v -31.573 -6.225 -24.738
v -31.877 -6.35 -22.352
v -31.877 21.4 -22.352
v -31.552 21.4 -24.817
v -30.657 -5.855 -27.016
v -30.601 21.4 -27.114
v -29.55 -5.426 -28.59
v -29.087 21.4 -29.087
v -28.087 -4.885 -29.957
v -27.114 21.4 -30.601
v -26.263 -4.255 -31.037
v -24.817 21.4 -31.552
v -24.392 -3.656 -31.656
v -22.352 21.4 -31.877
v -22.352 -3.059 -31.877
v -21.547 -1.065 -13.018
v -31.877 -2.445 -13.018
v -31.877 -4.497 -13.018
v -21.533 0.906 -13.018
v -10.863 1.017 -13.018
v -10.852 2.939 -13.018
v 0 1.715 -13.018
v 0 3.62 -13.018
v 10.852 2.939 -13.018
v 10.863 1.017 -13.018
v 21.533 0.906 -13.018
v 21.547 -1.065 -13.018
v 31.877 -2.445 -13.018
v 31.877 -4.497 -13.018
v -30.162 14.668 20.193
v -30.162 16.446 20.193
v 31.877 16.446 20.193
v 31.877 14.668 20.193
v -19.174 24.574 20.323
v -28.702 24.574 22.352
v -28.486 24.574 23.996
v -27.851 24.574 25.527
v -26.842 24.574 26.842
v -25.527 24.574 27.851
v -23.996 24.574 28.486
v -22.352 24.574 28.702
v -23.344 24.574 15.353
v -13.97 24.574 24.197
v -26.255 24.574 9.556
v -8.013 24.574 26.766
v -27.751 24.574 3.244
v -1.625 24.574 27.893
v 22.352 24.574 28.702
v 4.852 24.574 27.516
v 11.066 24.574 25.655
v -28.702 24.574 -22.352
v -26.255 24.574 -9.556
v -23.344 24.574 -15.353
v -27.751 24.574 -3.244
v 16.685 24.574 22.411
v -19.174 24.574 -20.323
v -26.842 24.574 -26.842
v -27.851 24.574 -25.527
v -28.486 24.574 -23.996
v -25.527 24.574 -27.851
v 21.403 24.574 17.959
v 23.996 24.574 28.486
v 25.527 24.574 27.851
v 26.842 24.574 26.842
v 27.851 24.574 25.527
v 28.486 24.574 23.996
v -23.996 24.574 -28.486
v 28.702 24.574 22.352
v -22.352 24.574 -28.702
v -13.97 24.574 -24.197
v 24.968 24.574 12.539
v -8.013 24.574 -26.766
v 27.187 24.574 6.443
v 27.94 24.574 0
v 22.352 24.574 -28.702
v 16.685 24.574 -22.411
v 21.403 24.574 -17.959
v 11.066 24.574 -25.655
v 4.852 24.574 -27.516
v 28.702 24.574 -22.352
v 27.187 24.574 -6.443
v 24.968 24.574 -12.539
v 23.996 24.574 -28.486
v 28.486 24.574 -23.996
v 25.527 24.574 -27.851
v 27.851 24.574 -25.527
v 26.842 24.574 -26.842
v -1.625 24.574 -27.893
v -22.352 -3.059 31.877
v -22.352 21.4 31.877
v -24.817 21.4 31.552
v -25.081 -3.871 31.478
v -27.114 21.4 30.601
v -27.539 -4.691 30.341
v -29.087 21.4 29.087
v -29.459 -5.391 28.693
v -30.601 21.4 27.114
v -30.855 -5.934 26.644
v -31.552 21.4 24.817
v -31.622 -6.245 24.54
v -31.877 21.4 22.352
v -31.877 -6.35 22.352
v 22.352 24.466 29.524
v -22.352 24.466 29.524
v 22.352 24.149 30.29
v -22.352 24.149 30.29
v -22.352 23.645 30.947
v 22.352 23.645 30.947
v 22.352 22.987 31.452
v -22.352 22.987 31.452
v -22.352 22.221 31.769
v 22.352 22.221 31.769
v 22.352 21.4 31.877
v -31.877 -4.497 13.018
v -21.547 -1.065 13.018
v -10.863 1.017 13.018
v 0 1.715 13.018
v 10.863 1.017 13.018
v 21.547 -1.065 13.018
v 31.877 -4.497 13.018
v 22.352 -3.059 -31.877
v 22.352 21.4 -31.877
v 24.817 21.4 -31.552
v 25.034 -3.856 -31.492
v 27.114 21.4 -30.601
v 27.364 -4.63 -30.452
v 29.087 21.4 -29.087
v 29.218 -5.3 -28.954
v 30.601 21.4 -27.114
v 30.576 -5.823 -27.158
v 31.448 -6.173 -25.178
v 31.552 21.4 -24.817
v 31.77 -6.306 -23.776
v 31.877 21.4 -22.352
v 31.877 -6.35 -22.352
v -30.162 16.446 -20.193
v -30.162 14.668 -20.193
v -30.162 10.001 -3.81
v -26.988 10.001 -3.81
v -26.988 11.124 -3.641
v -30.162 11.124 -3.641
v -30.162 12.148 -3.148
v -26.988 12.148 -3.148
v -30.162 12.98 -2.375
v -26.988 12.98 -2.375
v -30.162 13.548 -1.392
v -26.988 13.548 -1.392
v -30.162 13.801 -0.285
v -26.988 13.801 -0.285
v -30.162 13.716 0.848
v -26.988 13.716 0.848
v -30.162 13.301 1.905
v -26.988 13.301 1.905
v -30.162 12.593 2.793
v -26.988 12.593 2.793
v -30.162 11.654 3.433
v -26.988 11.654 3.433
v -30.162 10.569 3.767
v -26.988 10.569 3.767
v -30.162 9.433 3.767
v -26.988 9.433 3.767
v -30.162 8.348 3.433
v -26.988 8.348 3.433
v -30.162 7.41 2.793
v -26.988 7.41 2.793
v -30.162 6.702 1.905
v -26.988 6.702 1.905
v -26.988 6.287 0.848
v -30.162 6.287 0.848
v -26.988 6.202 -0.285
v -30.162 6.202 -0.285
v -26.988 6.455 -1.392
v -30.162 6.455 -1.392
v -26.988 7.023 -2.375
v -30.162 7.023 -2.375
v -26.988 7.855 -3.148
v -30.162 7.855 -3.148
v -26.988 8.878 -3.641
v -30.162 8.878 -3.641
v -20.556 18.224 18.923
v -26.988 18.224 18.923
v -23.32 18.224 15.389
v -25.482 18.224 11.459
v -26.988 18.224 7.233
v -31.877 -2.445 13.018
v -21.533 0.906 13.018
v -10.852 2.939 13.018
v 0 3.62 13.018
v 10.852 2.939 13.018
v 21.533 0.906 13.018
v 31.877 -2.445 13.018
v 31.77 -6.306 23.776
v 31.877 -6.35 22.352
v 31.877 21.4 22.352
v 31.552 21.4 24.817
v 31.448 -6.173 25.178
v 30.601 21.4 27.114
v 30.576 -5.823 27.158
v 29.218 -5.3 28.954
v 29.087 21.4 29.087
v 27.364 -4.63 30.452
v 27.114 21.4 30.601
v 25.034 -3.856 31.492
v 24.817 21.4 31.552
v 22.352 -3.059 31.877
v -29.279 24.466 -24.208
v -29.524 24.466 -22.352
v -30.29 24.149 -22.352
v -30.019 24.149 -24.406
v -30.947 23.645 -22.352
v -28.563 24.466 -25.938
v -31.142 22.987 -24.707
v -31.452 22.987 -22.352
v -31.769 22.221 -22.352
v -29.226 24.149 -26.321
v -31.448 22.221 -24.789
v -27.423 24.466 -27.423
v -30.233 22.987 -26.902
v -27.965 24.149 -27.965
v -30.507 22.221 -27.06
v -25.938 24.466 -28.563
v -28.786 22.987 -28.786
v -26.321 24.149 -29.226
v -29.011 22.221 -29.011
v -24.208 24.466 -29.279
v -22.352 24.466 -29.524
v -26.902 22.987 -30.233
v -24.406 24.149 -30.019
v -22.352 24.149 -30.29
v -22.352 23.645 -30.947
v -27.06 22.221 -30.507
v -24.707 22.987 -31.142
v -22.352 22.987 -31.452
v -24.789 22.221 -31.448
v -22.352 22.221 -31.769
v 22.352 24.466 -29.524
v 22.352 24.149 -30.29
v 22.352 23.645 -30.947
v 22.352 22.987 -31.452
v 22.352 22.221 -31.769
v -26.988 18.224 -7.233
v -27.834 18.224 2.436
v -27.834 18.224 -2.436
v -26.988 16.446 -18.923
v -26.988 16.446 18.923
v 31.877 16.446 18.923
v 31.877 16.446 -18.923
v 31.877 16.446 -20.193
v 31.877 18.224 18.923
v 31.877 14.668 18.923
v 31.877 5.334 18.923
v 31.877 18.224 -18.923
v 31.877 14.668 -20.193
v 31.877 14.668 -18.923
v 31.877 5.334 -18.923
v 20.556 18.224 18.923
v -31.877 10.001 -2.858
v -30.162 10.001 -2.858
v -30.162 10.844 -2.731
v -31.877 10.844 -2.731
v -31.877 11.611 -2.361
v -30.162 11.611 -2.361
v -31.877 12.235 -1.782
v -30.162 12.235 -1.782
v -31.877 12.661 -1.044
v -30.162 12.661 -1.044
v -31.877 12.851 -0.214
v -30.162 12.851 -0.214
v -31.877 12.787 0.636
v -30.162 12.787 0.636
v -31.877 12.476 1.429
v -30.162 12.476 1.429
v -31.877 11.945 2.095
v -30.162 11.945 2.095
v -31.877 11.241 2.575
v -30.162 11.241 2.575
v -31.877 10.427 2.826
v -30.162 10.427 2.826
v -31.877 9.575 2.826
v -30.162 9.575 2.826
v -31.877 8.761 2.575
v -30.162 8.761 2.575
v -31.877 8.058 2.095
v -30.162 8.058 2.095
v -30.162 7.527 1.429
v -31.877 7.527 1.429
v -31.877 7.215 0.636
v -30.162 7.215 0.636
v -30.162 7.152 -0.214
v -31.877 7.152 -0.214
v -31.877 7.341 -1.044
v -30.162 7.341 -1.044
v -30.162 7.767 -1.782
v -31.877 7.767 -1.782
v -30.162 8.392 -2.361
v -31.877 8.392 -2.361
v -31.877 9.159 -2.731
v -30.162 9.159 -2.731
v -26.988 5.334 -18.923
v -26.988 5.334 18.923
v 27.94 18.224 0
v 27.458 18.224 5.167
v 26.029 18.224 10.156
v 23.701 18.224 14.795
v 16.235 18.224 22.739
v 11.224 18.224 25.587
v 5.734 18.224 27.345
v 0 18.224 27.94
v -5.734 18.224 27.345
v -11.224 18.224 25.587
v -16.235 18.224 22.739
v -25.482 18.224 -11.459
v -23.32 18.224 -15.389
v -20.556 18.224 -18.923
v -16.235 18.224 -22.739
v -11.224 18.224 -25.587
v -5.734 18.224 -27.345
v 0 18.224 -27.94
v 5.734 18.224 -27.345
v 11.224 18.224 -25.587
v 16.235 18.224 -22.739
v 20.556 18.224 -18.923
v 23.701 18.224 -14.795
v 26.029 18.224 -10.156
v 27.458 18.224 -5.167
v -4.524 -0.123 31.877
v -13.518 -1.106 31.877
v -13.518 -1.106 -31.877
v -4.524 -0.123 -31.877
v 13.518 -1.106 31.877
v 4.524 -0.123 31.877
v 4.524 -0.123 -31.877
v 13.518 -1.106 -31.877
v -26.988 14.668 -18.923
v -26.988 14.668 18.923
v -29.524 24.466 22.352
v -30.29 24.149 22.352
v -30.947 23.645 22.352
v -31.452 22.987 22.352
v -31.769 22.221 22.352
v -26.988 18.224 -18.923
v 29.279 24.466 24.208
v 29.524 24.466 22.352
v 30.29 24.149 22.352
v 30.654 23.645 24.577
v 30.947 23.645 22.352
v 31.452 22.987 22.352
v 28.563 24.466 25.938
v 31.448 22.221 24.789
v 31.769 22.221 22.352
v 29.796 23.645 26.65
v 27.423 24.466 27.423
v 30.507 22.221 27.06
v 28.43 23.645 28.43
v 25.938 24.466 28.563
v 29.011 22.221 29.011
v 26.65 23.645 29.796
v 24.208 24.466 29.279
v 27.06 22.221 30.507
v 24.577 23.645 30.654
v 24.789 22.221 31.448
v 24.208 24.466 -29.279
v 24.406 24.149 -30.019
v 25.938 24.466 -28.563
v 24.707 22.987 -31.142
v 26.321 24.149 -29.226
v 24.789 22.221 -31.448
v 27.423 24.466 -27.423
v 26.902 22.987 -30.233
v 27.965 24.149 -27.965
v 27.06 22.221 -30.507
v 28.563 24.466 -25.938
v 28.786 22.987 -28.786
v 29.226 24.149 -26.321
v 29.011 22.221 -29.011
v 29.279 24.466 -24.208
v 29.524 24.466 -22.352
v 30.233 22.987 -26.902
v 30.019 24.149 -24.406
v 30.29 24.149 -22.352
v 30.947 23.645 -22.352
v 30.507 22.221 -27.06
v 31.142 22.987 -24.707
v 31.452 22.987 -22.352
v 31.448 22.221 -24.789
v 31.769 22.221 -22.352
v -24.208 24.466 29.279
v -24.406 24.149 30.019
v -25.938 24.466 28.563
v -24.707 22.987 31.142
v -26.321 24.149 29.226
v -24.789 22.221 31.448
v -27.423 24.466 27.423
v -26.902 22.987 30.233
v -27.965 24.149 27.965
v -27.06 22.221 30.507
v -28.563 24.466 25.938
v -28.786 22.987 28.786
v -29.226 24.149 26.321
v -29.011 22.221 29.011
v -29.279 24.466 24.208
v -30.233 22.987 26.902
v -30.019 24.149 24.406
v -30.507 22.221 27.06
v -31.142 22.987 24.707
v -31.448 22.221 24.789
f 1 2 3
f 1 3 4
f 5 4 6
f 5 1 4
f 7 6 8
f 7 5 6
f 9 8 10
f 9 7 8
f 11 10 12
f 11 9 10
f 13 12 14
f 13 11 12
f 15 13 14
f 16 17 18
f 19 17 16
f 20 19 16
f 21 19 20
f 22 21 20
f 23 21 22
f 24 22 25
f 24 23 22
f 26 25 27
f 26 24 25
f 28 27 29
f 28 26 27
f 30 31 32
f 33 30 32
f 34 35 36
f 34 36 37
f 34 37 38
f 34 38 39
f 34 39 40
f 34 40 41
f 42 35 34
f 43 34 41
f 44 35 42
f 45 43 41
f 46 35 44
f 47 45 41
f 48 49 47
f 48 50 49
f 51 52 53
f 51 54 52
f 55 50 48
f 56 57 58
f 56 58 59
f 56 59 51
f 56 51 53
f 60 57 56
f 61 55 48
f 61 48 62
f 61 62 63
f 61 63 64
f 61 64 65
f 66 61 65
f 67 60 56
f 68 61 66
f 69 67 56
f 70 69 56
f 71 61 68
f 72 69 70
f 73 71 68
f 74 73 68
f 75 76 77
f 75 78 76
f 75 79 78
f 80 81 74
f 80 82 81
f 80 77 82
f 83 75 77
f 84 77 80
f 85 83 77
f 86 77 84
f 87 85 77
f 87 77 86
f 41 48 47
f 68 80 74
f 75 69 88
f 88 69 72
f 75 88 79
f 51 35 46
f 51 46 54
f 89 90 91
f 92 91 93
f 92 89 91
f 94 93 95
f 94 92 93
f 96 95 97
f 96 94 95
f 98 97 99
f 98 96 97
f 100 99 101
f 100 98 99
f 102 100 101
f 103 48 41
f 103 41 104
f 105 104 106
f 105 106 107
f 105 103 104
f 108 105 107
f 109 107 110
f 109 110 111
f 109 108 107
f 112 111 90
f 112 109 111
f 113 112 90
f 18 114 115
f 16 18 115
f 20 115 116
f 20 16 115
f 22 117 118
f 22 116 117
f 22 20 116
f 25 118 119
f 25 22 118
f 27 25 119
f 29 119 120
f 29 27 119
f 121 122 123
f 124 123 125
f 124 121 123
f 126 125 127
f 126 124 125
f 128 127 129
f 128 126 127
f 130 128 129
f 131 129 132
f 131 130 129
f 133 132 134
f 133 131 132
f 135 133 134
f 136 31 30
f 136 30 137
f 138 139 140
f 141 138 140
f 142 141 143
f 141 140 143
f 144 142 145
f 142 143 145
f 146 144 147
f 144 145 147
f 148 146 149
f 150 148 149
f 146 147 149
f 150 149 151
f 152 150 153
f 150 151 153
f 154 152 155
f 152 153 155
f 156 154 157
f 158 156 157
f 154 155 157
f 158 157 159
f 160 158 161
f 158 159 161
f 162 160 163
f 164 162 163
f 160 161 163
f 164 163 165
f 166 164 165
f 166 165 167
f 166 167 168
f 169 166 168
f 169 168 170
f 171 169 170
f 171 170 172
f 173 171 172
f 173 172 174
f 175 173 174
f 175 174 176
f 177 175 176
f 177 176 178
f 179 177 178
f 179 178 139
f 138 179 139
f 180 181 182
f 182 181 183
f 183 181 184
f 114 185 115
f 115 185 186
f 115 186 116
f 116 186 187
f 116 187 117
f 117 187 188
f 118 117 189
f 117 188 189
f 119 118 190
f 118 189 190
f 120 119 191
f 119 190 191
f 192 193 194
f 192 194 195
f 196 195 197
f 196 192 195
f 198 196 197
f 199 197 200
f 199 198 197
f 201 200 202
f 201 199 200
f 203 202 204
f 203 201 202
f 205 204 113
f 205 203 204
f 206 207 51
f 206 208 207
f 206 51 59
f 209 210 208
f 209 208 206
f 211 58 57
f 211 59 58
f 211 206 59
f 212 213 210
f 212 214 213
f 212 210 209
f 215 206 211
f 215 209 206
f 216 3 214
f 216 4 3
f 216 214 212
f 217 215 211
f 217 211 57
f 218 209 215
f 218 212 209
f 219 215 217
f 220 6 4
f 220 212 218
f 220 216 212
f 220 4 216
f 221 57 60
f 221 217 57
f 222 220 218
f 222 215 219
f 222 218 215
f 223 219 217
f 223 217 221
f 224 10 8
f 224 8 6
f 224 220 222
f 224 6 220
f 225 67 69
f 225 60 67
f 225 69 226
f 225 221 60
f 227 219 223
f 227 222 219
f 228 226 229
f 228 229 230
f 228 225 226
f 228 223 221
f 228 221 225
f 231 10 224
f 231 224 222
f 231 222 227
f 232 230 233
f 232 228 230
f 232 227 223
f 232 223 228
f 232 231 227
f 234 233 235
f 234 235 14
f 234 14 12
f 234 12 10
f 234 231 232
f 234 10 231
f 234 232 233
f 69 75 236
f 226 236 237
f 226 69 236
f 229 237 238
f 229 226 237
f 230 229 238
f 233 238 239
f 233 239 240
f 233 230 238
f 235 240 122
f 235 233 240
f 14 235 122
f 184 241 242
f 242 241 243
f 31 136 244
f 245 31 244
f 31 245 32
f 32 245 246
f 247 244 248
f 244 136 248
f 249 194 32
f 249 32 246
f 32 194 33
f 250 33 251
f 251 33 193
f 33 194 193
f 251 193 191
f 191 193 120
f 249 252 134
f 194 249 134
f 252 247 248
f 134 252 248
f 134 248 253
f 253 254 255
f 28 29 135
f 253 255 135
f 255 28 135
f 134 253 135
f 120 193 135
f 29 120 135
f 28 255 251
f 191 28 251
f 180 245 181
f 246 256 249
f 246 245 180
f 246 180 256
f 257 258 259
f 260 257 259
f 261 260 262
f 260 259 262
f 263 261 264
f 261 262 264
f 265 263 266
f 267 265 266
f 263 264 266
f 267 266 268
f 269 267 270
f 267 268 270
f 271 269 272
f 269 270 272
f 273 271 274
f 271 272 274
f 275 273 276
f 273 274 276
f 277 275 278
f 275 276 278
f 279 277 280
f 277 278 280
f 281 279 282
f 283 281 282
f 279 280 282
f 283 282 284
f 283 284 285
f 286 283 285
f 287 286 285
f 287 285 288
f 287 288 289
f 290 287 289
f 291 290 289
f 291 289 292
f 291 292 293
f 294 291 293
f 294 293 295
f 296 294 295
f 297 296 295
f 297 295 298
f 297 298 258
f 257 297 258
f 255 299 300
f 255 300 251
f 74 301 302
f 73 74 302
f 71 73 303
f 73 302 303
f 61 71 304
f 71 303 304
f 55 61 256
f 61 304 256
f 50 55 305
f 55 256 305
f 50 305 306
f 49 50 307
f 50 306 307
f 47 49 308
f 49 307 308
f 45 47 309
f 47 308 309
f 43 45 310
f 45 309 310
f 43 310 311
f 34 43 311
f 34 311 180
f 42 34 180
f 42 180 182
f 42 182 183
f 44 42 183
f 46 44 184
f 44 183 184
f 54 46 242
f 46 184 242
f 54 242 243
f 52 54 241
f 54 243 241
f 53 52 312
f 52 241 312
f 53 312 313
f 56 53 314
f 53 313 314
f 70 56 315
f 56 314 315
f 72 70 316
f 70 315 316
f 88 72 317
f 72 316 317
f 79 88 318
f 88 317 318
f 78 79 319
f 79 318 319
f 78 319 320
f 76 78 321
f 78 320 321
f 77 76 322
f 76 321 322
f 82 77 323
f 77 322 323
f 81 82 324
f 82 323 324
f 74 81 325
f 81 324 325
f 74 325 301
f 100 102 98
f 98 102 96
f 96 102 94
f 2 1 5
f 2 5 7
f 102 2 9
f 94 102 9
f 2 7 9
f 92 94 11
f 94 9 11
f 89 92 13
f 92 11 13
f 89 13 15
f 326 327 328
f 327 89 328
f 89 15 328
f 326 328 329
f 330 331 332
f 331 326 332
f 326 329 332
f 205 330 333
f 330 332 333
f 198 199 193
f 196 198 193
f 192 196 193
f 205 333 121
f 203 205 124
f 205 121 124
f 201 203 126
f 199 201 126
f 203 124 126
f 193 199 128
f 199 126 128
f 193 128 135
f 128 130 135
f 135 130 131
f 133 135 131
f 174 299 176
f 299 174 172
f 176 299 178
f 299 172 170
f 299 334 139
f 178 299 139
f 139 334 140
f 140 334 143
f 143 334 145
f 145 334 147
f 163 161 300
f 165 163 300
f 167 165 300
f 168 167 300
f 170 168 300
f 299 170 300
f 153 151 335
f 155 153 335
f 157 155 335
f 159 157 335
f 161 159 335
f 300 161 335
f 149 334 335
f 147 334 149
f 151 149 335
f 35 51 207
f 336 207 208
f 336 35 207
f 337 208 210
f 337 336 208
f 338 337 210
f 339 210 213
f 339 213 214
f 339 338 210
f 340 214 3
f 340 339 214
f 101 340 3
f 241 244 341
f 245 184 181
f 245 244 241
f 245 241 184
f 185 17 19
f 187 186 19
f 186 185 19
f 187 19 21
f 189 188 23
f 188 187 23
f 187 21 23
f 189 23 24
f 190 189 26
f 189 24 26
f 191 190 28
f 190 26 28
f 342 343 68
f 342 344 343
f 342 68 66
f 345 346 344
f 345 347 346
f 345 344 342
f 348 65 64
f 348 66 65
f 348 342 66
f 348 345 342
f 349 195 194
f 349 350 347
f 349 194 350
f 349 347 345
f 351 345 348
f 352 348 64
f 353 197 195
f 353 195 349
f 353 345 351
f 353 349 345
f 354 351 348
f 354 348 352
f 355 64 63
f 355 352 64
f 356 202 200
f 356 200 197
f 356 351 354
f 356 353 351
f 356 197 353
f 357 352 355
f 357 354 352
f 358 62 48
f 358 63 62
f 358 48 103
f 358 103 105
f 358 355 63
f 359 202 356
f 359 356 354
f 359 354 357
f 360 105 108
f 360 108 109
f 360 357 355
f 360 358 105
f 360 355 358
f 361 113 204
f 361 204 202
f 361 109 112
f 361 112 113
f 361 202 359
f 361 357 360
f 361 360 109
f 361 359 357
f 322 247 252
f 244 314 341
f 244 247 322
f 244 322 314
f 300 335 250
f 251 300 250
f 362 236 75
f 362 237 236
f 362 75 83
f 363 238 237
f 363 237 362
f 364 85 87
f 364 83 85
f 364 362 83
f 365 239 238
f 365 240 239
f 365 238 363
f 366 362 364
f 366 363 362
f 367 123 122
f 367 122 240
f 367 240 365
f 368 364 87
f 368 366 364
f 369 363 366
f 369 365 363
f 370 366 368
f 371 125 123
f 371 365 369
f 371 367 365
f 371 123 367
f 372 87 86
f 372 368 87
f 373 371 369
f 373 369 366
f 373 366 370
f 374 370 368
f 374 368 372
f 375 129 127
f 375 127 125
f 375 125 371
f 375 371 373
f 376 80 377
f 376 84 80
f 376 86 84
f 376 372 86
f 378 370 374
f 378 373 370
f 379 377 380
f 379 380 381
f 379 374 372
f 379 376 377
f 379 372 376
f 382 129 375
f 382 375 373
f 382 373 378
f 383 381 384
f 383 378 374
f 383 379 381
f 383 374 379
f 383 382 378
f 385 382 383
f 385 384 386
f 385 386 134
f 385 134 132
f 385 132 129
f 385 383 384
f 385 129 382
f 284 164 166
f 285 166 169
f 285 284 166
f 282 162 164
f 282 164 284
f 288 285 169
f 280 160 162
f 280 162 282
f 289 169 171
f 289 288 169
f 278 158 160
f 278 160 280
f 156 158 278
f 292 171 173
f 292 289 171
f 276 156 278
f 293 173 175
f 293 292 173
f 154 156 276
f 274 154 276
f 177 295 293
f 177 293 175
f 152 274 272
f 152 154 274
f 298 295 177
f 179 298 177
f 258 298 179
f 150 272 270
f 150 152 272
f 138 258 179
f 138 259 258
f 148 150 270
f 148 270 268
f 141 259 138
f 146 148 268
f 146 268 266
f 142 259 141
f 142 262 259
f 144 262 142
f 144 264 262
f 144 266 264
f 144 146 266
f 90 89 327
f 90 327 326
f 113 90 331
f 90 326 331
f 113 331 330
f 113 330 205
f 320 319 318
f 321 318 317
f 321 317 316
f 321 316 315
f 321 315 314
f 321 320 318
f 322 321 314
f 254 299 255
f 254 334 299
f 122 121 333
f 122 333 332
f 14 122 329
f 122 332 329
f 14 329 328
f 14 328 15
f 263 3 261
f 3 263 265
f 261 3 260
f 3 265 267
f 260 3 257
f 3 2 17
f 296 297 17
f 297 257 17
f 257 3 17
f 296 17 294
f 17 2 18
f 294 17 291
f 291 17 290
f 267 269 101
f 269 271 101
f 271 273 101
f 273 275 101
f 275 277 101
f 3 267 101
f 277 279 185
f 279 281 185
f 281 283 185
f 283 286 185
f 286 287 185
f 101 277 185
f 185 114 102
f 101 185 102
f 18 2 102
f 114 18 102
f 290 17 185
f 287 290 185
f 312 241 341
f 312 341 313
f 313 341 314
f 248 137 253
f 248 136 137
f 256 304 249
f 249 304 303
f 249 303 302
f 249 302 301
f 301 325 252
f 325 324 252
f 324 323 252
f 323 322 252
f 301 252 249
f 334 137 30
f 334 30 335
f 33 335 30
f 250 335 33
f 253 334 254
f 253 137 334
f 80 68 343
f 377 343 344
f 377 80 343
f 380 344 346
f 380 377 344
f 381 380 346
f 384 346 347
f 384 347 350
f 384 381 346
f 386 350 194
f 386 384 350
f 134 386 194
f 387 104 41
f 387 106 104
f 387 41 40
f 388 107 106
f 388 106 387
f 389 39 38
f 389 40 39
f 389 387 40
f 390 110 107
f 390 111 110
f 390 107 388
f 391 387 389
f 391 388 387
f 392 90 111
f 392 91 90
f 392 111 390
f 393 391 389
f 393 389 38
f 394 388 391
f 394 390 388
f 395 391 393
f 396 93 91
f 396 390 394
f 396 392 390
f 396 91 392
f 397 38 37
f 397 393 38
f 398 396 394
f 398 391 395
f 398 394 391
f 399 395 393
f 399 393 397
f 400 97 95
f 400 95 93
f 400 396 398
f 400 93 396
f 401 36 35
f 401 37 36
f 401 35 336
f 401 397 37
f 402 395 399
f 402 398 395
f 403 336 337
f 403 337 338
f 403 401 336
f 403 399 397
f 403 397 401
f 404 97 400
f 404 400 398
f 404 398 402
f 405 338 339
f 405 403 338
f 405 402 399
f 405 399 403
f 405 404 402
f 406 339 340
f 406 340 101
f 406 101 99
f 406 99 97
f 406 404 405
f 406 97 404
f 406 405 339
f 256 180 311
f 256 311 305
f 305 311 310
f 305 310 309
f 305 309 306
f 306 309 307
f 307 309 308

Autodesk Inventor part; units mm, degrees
ref_plane "YZ Plane" through (0, 0, 0) normal (1, 0, 0) x (0, 1, 0)
ref_plane "XZ Plane" through (0, 0, 0) normal (0, 1, 0) x (-1, 0, 0)
ref_plane "XY Plane" through (0, 0, 0) normal (0, 0, 1) x (1, 0, 0)
sketch "Sketch1" plane through (0, 0, 0) normal (0, 0, 1) x (1, 0, 0)
  arc A0 (31.877, -6.35) -> (-31.877, -6.35) centre (0, -83.1863) ccw
  line L0 (-31.877, -6.35) -> (31.877, -6.35) construction
  line L1 (0, 36.3731) -> (0, -103.1128) construction
  line L2 (-44.6278, 0) -> (44.6278, 0) construction
  line L3 (-31.877, -6.35) -> (-31.877, -4.497)
  line L4 (-31.877, 16.4465) -> (31.877, 16.4465)
  line L5 (31.877, 16.4465) -> (31.877, -2.4453)
  line L6 (-30.1625, 16.4465) -> (-30.1625, 5.334) construction
  line L7 (-30.1625, 5.334) -> (30.1625, 5.334) construction
  line L8 (30.1625, 5.334) -> (30.1625, 16.4465) construction
  arc A1 (31.877, -4.497) -> (-31.877, -4.497) centre (0, -83.1863) ccw
  arc A2 (31.877, -2.4453) -> (-31.877, -2.4453) centre (0, -83.1863) ccw
  line L9 (-30.1625, 13.1134) -> (-26.9875, 13.1134) construction
  line L10 (-26.9875, 13.1134) -> (-26.9875, 5.334) construction
  line L11 (30.1625, 12.4907) -> (26.9875, 12.4907) construction
  line L12 (26.9875, 12.4907) -> (26.9875, 5.334) construction
  line L13 (-31.877, -2.4453) -> (-31.877, 16.4465)
  line L14 (-31.877, -4.497) -> (-31.877, -2.4453)
  line L15 (31.877, -2.4453) -> (31.877, -4.497)
  line L16 (31.877, -4.497) -> (31.877, -6.35)
  point P0 (0, 0)
  point P1 (0, 3.6195)
  dimension "d0" = 1.7145
  dimension "d2" = 1.7145
  dimension "d3" = 1.905
  dimension "d4" = 1.7145
  dimension "d5" = 1.7145
  dimension "d6" = 11.1125
  dimension "d7" = 3.175
  dimension "d8" = 3.175
  dimension "d10" = 60.325
  dimension "d11" = 6.35
extrude "Extrusion1" add sketch "Sketch1" along normal mid plane 63.754
sketch "Sketch2" plane through (-31.877, 16.4465, 31.877) normal (0, 1, 0) x (1, 0, 0)
  line L0 (62.0395, 1.7145) -> (1.7145, 1.7145)
  line L1 (1.7145, 1.7145) -> (1.7145, 11.684)
  line L2 (1.7145, 62.0395) -> (62.0395, 62.0395)
  line L3 (62.0395, 62.0395) -> (62.0395, 52.07)
  line L4 (62.0395, 1.7145) -> (1.7145, 62.0395) construction
  line L5 (1.7145, 1.7145) -> (62.0395, 62.0395) construction
  line L6 (0, 63.754) -> (0, 0) projected
  line L7 (76.5048, 31.877) -> (-12.7508, 31.877) construction
  line L8 (31.877, 76.5048) -> (31.877, -12.7508) construction
  line L9 (1.7145, 11.684) -> (62.0395, 11.684)
  line L10 (1.7145, 11.684) -> (1.7145, 52.07)
  line L11 (1.7145, 52.07) -> (62.0395, 52.07)
  line L12 (1.7145, 52.07) -> (1.7145, 62.0395)
  line L13 (62.0395, 11.684) -> (62.0395, 1.7145)
  line L14 (0, 63.754) -> (63.754, 63.754) projected
  line L15 (4.8895, 50.8) -> (63.754, 50.8)
  line L16 (4.8895, 50.8) -> (4.8895, 12.954)
  line L17 (63.754, 63.754) -> (63.754, 0) projected
  line L18 (63.754, 50.8) -> (63.754, 12.954)
  line L19 (63.754, 0) -> (63.754, 63.754) projected
  line L20 (4.8895, 12.954) -> (63.754, 12.954)
  line L21 (62.0395, 11.684) -> (63.754, 11.684)
  line L22 (63.754, 12.954) -> (63.754, 11.684)
  line L23 (62.0395, 52.07) -> (63.754, 52.07)
  line L24 (63.754, 52.07) -> (63.754, 50.8)
  point P0 (31.877, 31.877)
  dimension "d14" = 1.7145
  dimension "d17" = 1.7145
  dimension "d34" = 1.27
  dimension "d35" = 1.7145
  dimension "d36" = 3.175
  dimension "d37" = 40.386
extrude "Extrusion2" cut sketch "Sketch2" against normal blind 11.1125 contours L20 L16 L15 L17
extrude "Extrusion3" cut sketch "Sketch2" against normal blind 1.778 contours L9 L10 L11 L23 L17 L15 L16 L20 L21
extrude "Extrusion6" cut sketch "Sketch1" along normal mid plane 26.035 contours A1 L14 A2 L15
fillet "Fillet1" radius 9.525 4 edges at (31.877, 5.0483, 31.877) (31.877, 5.0483, -31.877) (-31.877, 5.0483, 31.877) (-31.877, 5.0483, -31.877)
sketch "Sketch6" plane through (-26.9875, 5.334, 18.923) normal (1, 0, 0) x (0, 0, -1)
  circle A0 centre (18.923, 4.6673) radius 3.81
  circle A1 centre (18.923, 4.6673) radius 2.8575
  line L0 (0, 0) -> (0, 9.3345) projected
  line L1 (37.846, 0) -> (0, 0) projected
  point P0 (18.923, -5.334)
  point P1 (0, 4.6673)
  point P2 (18.923, 0)
  dimension "d38" = 7.62
  dimension "d39" = 5.715
extrude "Extrusion7" cut sketch "Sketch6" against normal up to next contours A1
extrude "Extrusion8" cut sketch "Sketch6" against normal blind 3.175
sketch "Sketch7" plane through (-30.1625, 16.4465, 20.193) normal (0, 1, 0) x (1, 0, 0)
  line L0 (7.8105, 52.07) -> (52.5145, 52.07) projected
  arc A0 (7.8105, 52.07) -> (-1.7145, 42.545) centre (7.8105, 42.545) ccw projected
  arc A1 (62.0395, 42.545) -> (52.5145, 52.07) centre (52.5145, 42.545) ccw projected
  line L1 (-1.7145, -2.159) -> (-1.7145, 42.545) projected
  arc A2 (-1.7145, -2.159) -> (7.8105, -11.684) centre (7.8105, -2.159) ccw projected
  line L2 (52.5145, -11.684) -> (7.8105, -11.684) projected
  arc A3 (52.5145, -11.684) -> (62.0395, -2.159) centre (52.5145, -2.159) ccw projected
  line L3 (62.0395, 42.545) -> (62.0395, 40.386) projected
  line L4 (62.0395, 42.545) -> (62.0395, 39.116)
  line L5 (62.0395, 39.116) -> (3.175, 39.116) projected
  line L6 (3.175, 39.116) -> (3.175, 1.27) projected
  line L7 (3.175, 1.27) -> (62.0395, 1.27) projected
  line L8 (62.0395, 39.116) -> (62.0395, 1.27)
  line L9 (62.0395, 1.27) -> (62.0395, -2.159)
  point P0 (30.1625, 20.193)
extrude "Extrusion9" add sketch "Sketch7" along normal blind 1.778 contours L0 A1 L3 L4 L5 L6 L7 L9 A3 L2 A2 L1 A0
sketch "Sketch8" plane through (-30.1625, 18.2245, 20.193) normal (0, 1, 0) x (1, 0, 0)
  line L0 (52.5145, 52.07) -> (7.8105, 52.07) projected
  arc A0 (62.0395, 42.545) -> (52.5145, 52.07) centre (52.5145, 42.545) ccw projected
  arc A1 (7.8105, 52.07) -> (-1.7145, 42.545) centre (7.8105, 42.545) ccw projected
  line L1 (-1.7145, 42.545) -> (-1.7145, -2.159) projected
  arc A2 (-1.7145, -2.159) -> (7.8105, -11.684) centre (7.8105, -2.159) ccw projected
  line L2 (7.8105, -11.684) -> (52.5145, -11.684) projected
  arc A3 (52.5145, -11.684) -> (62.0395, -2.159) centre (52.5145, -2.159) ccw projected
  line L3 (62.0395, -2.159) -> (62.0395, 42.545) projected
  line L4 (62.0395, 42.545) -> (62.0395, -2.159)
  circle A4 centre (30.1625, 20.193) radius 27.94
  dimension "d47" = 55.88
extrude "Extrusion10" add sketch "Sketch8" along normal blind 6.35
fillet "Fillet2" radius 3.175 8 edges at (29.0872, 24.5745, 29.0872) (31.877, 24.5745, 0) (29.0872, 24.5745, -29.0872) (0, 24.5745, -31.877) (-29.0872, 24.5745, -29.0872) (-31.877, 24.5745, 0) (-29.0872, 24.5745, 29.0872) (0, 24.5745, 31.877)
equation "\"d17\" = d14"
equation "\"d35\" = d17"
equation "\"d18\" = d6"
properties part number "Track v3"
